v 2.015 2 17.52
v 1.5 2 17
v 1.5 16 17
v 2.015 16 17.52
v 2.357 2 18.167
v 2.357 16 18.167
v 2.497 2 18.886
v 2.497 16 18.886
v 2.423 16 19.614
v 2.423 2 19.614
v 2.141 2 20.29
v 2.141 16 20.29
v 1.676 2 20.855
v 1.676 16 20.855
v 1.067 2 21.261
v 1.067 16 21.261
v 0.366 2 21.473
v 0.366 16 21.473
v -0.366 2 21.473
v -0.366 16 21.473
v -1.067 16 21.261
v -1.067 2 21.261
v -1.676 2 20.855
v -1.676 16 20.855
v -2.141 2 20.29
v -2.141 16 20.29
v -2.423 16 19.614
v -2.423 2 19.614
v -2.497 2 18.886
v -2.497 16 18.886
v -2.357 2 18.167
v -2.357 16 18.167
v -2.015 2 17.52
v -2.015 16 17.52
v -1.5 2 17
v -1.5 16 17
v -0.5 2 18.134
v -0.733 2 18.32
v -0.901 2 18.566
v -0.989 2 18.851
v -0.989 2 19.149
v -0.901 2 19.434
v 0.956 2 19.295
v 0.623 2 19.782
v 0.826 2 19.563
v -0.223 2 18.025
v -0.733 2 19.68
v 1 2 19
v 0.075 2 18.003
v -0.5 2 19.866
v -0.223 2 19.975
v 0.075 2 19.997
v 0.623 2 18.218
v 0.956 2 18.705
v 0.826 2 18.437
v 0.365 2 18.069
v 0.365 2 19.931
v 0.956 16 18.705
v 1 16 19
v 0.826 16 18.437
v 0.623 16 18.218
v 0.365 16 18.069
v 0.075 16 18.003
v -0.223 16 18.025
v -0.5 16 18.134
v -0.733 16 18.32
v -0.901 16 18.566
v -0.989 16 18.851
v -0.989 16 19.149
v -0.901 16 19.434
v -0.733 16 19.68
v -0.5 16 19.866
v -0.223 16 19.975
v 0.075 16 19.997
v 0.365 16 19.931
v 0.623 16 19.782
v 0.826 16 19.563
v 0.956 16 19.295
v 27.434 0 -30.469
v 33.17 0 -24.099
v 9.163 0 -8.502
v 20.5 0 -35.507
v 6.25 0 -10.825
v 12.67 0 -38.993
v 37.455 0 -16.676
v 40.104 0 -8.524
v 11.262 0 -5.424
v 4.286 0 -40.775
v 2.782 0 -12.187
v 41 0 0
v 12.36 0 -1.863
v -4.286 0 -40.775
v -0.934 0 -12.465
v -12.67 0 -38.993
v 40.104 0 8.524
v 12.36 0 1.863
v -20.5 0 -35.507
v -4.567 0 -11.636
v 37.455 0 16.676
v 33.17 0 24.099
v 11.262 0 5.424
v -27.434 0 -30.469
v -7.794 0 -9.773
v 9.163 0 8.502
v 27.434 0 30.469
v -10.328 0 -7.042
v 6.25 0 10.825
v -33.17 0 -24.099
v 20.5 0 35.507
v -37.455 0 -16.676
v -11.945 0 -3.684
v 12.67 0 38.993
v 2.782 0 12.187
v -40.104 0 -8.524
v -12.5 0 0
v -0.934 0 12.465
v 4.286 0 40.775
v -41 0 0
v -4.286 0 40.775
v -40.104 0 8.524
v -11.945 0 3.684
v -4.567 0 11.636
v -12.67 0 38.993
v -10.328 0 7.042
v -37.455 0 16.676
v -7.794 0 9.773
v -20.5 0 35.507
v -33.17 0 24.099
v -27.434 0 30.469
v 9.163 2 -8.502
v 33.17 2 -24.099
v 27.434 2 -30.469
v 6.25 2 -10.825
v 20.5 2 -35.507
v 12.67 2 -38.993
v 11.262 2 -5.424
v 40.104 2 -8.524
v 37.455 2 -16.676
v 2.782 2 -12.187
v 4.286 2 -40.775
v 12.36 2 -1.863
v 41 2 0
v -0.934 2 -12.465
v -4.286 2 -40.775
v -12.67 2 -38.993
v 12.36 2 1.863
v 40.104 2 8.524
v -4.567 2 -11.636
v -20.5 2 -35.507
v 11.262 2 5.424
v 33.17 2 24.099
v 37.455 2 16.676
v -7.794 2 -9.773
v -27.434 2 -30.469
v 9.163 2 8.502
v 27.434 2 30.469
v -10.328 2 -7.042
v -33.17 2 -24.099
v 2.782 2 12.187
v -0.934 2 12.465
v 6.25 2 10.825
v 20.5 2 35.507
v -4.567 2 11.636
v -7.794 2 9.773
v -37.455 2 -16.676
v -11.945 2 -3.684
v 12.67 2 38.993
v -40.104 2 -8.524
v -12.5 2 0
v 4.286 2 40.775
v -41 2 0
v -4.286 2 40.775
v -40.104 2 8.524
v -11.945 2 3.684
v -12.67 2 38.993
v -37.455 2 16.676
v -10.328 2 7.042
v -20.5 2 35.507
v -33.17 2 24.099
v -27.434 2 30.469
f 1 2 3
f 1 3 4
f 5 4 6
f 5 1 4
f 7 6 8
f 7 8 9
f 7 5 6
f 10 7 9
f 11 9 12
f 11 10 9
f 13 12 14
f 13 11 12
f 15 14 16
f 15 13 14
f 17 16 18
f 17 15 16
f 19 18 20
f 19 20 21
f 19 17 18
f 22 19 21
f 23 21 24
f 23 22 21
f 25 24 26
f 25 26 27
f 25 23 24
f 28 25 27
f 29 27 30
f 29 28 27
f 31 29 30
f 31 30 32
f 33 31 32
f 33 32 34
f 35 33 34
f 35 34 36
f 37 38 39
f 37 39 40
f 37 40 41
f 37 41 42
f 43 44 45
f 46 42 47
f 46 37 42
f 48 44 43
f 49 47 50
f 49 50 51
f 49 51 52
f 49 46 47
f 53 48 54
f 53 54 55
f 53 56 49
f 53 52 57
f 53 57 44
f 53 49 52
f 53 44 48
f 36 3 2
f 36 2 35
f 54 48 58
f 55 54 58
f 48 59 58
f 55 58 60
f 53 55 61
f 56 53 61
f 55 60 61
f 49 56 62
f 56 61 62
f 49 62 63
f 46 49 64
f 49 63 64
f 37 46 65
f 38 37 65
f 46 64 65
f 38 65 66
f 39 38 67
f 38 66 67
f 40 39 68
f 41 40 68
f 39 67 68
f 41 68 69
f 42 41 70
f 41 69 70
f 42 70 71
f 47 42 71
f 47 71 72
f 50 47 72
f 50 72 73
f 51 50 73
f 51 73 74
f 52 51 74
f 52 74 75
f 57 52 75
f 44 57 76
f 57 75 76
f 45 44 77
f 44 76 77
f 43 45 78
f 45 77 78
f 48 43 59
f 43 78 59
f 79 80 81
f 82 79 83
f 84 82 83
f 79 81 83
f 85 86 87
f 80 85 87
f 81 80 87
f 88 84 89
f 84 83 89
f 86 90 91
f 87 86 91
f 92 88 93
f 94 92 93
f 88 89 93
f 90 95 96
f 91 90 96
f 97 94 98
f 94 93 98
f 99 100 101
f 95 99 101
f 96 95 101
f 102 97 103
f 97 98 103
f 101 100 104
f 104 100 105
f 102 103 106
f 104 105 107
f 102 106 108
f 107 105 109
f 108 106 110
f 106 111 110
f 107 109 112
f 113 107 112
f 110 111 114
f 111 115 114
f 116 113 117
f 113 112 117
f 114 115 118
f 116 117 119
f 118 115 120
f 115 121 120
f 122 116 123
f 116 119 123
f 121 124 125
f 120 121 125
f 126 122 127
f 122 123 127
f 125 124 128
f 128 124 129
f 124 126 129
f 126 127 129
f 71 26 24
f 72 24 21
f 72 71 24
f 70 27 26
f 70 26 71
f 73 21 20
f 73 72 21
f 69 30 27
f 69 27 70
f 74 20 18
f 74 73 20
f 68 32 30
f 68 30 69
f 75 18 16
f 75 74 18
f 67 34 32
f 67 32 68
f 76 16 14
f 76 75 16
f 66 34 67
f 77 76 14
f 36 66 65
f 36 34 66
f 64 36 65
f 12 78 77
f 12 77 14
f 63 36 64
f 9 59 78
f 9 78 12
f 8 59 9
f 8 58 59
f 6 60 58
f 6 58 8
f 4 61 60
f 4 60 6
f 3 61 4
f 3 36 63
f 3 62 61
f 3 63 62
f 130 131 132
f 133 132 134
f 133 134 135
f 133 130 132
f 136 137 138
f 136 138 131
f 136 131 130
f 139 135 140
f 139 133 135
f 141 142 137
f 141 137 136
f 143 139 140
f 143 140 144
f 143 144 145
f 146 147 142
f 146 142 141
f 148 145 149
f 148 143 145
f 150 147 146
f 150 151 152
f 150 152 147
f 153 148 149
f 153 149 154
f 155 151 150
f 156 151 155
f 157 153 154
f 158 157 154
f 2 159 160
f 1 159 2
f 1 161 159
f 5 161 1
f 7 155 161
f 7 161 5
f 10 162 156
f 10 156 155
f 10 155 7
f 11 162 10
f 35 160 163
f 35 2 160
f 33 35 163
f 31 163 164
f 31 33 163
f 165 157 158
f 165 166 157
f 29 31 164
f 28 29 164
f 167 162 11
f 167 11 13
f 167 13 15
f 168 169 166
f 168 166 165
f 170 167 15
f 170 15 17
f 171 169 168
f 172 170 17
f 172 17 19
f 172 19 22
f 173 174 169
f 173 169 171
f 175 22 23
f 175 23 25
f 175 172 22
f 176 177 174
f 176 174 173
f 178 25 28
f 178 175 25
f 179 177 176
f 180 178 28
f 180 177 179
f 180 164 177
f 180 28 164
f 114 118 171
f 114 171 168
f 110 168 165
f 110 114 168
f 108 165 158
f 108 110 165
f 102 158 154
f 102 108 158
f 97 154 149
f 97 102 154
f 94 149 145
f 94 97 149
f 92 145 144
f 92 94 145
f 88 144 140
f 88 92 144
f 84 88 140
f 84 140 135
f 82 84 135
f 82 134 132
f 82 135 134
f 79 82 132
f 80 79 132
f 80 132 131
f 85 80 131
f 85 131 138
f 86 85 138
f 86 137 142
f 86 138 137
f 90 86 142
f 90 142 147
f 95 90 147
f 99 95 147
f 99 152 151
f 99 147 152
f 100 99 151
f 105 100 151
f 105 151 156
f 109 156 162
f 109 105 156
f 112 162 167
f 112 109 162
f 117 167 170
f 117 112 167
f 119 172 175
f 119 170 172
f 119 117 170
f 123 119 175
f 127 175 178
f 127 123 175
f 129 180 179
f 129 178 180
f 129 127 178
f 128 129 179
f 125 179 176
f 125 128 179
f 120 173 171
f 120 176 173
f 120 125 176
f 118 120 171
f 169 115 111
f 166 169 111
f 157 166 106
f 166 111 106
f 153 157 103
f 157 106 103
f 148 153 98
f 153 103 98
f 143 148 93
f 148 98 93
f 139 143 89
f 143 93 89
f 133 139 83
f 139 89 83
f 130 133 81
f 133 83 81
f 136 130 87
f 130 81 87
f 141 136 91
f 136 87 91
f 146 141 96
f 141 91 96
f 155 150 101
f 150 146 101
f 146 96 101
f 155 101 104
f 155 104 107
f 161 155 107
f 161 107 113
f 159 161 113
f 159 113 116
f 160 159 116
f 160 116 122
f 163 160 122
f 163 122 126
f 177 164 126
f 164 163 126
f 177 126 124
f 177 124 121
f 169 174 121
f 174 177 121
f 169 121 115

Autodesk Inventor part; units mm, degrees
ref_plane "YZ Plane" through (0, 0, 0) normal (1, 0, 0) x (0, 1, 0)
ref_plane "XZ Plane" through (0, 0, 0) normal (0, 1, 0) x (-1, 0, 0)
ref_plane "XY Plane" through (0, 0, 0) normal (0, 0, 1) x (1, 0, 0)
sketch "Sketch1" plane through (0, 0, 0) normal (0, 1, 0) x (-1, 0, 0)
  circle A0 centre (0, 0) radius 41
  circle A1 centre (0, 0) radius 12.5
  dimension "d0" = 82
  dimension "d1" = 25
extrude "Extrusion1" add sketch "Sketch1" along normal blind 2
sketch "Sketch2" plane through (0, 2, 0) normal (0, 1, 0) x (1, 0, 0)
  line L0 (0, 0) -> (0, -19)
  line L1 (0, 0) -> (19, 0) construction
  circle A0 centre (0, -19) radius 2.5
  dimension "d4" = 19
  dimension "d5" = 90
  dimension "d6" = 5
extrude "Extrusion2" add sketch "Sketch2" along normal blind 14
sketch "Sketch3" plane through (0, 16, 19) normal (0, 1, 0) x (1, 0, 0)
  circle A0 centre (0, 0) radius 2.5 projected
  circle A1 centre (0, 0) radius 1
  point P0 (0, 19)
  dimension "d9" = 2
extrude "Extrusion3" cut sketch "Sketch3" against normal blind 14 contours A1
sketch "Sketch4" plane through (0, 16, 19) normal (0, 1, 0) x (1, 0, 0)
  circle A0 centre (0, 0) radius 1 projected
  line L0 (0, 0) -> (0, 2.5)
  circle A1 centre (0, 0) radius 2.5 projected
  line L1 (0, 2.5) -> (0, 2)
  line L2 (0, 2) -> (-3, 2)
  line L3 (-3, 2) -> (-3, 2.5)
  line L4 (-3, 2.5) -> (0, 2.5)
  line L5 (0, 2.5) -> (0, 2)
  line L6 (0, 2) -> (3, 2)
  line L7 (3, 2) -> (3, 2.5)
  line L8 (3, 2.5) -> (0, 2.5)
  point P0 (0, 19)
  point P1 (-1.5, 2)
  dimension "d12" = 0.5
  dimension "d13" = 3
  dimension "d14" = 0.5
  dimension "d15" = 3
extrude "Extrusion4" cut sketch "Sketch4" against normal blind 14 contours L2 A1 L0 | L0 A1 L6 | L8 L7 L6 A1
properties part number "lid"
